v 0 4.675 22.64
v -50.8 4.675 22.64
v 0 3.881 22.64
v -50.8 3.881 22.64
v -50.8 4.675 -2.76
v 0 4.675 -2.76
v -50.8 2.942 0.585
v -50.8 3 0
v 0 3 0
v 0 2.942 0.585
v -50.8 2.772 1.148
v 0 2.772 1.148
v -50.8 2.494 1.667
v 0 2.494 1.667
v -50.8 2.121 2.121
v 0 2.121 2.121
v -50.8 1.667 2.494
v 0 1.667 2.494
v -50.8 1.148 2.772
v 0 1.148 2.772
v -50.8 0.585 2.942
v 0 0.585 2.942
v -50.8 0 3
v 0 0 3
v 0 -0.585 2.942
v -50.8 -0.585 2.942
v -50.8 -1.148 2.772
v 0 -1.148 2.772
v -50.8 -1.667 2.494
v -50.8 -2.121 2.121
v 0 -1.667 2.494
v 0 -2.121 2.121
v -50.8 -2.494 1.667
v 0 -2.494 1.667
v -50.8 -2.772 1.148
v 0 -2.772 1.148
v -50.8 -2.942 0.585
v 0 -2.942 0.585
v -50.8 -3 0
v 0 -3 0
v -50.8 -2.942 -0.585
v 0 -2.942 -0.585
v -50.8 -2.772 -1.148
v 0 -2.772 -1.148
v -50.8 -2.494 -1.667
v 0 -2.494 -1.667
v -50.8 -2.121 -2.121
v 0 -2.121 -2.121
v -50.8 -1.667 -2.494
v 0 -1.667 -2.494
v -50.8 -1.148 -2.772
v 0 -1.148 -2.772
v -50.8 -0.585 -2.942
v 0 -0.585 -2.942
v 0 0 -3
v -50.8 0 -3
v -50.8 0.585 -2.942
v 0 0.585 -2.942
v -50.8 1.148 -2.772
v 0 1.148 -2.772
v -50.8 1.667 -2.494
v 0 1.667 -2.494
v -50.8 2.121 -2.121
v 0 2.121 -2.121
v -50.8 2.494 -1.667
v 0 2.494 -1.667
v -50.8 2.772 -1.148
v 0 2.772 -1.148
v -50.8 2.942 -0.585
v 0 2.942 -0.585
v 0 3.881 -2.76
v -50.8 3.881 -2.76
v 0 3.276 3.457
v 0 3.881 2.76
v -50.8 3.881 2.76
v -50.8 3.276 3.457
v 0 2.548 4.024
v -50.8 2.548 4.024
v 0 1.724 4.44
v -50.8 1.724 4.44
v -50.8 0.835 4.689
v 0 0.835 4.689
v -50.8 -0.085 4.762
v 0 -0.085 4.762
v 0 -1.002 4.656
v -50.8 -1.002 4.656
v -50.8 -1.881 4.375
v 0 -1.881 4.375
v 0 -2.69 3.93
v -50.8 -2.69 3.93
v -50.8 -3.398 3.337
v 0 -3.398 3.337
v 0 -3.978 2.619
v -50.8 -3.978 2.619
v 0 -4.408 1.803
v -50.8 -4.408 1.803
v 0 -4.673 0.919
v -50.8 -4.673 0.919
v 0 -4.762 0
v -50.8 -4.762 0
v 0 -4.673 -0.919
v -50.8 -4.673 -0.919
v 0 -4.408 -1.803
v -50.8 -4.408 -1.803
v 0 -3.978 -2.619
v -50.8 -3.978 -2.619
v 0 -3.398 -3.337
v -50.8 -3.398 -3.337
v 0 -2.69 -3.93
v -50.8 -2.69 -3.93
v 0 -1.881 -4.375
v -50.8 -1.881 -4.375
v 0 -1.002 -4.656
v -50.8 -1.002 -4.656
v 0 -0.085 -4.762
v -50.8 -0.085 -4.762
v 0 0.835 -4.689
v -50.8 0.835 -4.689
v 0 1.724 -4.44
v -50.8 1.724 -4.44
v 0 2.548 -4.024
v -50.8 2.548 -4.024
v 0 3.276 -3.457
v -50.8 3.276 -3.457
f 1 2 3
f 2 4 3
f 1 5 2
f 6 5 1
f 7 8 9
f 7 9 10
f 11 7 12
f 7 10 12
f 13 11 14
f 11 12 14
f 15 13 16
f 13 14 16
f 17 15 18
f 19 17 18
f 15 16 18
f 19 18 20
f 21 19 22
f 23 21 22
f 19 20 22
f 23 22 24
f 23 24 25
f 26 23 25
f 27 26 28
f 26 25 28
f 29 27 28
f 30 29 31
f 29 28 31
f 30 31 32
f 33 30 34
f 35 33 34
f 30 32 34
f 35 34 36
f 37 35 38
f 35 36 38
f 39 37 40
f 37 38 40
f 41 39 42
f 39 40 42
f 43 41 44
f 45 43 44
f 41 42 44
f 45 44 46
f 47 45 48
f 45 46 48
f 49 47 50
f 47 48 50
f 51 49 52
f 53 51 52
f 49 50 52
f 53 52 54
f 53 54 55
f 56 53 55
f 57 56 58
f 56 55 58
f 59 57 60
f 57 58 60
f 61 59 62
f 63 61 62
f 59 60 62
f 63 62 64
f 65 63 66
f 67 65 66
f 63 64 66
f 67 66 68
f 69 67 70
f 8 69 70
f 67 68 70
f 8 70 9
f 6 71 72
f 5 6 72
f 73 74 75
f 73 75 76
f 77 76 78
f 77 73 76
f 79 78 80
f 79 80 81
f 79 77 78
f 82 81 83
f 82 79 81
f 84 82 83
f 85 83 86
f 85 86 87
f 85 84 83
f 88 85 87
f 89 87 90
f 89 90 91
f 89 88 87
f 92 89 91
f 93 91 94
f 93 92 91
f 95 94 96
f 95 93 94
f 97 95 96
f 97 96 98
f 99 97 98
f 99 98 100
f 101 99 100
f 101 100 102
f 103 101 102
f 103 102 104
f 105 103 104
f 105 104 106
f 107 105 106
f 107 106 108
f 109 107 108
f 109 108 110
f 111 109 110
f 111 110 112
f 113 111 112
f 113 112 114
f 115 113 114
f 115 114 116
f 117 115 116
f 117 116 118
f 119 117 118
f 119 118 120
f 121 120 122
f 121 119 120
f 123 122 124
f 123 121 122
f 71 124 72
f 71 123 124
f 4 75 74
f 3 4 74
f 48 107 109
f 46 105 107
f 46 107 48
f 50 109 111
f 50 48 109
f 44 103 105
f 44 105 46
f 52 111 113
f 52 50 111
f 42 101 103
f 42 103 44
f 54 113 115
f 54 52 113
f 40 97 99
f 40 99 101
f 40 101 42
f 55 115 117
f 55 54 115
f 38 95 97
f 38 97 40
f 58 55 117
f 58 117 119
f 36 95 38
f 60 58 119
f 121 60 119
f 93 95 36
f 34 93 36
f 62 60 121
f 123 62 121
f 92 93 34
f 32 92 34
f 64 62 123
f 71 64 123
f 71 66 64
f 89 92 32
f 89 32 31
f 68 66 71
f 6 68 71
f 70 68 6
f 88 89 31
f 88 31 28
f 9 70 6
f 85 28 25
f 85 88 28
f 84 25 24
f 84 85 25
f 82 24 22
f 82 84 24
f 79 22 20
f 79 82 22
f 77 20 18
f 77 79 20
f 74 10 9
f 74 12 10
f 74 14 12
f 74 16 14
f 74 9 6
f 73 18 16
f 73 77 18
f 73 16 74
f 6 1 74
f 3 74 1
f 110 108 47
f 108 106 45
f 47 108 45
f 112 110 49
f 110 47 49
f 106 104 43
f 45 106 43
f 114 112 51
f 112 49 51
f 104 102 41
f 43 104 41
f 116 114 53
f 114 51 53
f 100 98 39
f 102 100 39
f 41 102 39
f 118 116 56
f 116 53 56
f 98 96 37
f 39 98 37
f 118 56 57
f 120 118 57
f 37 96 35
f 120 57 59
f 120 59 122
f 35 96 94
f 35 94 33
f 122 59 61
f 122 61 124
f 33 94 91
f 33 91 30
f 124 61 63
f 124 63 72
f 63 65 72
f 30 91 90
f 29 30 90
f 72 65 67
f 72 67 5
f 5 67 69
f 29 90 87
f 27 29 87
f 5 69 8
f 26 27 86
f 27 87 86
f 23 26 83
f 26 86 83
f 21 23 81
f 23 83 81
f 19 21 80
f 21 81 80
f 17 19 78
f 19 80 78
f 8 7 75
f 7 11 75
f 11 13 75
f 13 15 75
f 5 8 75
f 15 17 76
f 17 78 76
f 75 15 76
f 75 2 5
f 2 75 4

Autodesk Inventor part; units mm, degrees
ref_plane "YZ Plane" through (0, 0, 0) normal (1, 0, 0) x (0, 1, 0)
ref_plane "XZ Plane" through (0, 0, 0) normal (0, 1, 0) x (-1, 0, 0)
ref_plane "XY Plane" through (0, 0, 0) normal (0, 0, 1) x (1, 0, 0)
sketch "Sketch1" plane through (0, 0, 0) normal (1, 0, 0) x (0, 1, 0)
  circle A0 centre (0, 0) radius 3
  circle A1 centre (0, 0) radius 4.7625
  line L0 (4.7625, 0) -> (3, 0)
  line L1 (3.8813, 0) -> (3.8813, 2.7599)
  line L2 (3.8813, 0) -> (3.8813, -2.7599)
  dimension "d0" = 6
extrude "Extrusion1" add sketch "Sketch1" against normal blind 50.8 contours L2 A1 L1
sketch "Sketch2" plane through (0, 3.8813, 2.7599) normal (0, 1, 0) x (1, 0, 0)
  line L0 (0, 5.5199) -> (-50.8, 5.5199) projected
  line L1 (0, 5.5199) -> (-50.8, 5.5199)
  line L2 (-50.8, 5.5199) -> (-50.8, -19.8801)
  line L3 (-50.8, -19.8801) -> (0, -19.8801)
  line L4 (0, -19.8801) -> (0, 5.5199)
  point P0 (0, 0)
  dimension "d7" = 50.8
  dimension "d8" = 25.4
extrude "Extrusion2" add sketch "Sketch2" along normal blind 0.7937
properties part number "AxleHolder_3DPrint"
